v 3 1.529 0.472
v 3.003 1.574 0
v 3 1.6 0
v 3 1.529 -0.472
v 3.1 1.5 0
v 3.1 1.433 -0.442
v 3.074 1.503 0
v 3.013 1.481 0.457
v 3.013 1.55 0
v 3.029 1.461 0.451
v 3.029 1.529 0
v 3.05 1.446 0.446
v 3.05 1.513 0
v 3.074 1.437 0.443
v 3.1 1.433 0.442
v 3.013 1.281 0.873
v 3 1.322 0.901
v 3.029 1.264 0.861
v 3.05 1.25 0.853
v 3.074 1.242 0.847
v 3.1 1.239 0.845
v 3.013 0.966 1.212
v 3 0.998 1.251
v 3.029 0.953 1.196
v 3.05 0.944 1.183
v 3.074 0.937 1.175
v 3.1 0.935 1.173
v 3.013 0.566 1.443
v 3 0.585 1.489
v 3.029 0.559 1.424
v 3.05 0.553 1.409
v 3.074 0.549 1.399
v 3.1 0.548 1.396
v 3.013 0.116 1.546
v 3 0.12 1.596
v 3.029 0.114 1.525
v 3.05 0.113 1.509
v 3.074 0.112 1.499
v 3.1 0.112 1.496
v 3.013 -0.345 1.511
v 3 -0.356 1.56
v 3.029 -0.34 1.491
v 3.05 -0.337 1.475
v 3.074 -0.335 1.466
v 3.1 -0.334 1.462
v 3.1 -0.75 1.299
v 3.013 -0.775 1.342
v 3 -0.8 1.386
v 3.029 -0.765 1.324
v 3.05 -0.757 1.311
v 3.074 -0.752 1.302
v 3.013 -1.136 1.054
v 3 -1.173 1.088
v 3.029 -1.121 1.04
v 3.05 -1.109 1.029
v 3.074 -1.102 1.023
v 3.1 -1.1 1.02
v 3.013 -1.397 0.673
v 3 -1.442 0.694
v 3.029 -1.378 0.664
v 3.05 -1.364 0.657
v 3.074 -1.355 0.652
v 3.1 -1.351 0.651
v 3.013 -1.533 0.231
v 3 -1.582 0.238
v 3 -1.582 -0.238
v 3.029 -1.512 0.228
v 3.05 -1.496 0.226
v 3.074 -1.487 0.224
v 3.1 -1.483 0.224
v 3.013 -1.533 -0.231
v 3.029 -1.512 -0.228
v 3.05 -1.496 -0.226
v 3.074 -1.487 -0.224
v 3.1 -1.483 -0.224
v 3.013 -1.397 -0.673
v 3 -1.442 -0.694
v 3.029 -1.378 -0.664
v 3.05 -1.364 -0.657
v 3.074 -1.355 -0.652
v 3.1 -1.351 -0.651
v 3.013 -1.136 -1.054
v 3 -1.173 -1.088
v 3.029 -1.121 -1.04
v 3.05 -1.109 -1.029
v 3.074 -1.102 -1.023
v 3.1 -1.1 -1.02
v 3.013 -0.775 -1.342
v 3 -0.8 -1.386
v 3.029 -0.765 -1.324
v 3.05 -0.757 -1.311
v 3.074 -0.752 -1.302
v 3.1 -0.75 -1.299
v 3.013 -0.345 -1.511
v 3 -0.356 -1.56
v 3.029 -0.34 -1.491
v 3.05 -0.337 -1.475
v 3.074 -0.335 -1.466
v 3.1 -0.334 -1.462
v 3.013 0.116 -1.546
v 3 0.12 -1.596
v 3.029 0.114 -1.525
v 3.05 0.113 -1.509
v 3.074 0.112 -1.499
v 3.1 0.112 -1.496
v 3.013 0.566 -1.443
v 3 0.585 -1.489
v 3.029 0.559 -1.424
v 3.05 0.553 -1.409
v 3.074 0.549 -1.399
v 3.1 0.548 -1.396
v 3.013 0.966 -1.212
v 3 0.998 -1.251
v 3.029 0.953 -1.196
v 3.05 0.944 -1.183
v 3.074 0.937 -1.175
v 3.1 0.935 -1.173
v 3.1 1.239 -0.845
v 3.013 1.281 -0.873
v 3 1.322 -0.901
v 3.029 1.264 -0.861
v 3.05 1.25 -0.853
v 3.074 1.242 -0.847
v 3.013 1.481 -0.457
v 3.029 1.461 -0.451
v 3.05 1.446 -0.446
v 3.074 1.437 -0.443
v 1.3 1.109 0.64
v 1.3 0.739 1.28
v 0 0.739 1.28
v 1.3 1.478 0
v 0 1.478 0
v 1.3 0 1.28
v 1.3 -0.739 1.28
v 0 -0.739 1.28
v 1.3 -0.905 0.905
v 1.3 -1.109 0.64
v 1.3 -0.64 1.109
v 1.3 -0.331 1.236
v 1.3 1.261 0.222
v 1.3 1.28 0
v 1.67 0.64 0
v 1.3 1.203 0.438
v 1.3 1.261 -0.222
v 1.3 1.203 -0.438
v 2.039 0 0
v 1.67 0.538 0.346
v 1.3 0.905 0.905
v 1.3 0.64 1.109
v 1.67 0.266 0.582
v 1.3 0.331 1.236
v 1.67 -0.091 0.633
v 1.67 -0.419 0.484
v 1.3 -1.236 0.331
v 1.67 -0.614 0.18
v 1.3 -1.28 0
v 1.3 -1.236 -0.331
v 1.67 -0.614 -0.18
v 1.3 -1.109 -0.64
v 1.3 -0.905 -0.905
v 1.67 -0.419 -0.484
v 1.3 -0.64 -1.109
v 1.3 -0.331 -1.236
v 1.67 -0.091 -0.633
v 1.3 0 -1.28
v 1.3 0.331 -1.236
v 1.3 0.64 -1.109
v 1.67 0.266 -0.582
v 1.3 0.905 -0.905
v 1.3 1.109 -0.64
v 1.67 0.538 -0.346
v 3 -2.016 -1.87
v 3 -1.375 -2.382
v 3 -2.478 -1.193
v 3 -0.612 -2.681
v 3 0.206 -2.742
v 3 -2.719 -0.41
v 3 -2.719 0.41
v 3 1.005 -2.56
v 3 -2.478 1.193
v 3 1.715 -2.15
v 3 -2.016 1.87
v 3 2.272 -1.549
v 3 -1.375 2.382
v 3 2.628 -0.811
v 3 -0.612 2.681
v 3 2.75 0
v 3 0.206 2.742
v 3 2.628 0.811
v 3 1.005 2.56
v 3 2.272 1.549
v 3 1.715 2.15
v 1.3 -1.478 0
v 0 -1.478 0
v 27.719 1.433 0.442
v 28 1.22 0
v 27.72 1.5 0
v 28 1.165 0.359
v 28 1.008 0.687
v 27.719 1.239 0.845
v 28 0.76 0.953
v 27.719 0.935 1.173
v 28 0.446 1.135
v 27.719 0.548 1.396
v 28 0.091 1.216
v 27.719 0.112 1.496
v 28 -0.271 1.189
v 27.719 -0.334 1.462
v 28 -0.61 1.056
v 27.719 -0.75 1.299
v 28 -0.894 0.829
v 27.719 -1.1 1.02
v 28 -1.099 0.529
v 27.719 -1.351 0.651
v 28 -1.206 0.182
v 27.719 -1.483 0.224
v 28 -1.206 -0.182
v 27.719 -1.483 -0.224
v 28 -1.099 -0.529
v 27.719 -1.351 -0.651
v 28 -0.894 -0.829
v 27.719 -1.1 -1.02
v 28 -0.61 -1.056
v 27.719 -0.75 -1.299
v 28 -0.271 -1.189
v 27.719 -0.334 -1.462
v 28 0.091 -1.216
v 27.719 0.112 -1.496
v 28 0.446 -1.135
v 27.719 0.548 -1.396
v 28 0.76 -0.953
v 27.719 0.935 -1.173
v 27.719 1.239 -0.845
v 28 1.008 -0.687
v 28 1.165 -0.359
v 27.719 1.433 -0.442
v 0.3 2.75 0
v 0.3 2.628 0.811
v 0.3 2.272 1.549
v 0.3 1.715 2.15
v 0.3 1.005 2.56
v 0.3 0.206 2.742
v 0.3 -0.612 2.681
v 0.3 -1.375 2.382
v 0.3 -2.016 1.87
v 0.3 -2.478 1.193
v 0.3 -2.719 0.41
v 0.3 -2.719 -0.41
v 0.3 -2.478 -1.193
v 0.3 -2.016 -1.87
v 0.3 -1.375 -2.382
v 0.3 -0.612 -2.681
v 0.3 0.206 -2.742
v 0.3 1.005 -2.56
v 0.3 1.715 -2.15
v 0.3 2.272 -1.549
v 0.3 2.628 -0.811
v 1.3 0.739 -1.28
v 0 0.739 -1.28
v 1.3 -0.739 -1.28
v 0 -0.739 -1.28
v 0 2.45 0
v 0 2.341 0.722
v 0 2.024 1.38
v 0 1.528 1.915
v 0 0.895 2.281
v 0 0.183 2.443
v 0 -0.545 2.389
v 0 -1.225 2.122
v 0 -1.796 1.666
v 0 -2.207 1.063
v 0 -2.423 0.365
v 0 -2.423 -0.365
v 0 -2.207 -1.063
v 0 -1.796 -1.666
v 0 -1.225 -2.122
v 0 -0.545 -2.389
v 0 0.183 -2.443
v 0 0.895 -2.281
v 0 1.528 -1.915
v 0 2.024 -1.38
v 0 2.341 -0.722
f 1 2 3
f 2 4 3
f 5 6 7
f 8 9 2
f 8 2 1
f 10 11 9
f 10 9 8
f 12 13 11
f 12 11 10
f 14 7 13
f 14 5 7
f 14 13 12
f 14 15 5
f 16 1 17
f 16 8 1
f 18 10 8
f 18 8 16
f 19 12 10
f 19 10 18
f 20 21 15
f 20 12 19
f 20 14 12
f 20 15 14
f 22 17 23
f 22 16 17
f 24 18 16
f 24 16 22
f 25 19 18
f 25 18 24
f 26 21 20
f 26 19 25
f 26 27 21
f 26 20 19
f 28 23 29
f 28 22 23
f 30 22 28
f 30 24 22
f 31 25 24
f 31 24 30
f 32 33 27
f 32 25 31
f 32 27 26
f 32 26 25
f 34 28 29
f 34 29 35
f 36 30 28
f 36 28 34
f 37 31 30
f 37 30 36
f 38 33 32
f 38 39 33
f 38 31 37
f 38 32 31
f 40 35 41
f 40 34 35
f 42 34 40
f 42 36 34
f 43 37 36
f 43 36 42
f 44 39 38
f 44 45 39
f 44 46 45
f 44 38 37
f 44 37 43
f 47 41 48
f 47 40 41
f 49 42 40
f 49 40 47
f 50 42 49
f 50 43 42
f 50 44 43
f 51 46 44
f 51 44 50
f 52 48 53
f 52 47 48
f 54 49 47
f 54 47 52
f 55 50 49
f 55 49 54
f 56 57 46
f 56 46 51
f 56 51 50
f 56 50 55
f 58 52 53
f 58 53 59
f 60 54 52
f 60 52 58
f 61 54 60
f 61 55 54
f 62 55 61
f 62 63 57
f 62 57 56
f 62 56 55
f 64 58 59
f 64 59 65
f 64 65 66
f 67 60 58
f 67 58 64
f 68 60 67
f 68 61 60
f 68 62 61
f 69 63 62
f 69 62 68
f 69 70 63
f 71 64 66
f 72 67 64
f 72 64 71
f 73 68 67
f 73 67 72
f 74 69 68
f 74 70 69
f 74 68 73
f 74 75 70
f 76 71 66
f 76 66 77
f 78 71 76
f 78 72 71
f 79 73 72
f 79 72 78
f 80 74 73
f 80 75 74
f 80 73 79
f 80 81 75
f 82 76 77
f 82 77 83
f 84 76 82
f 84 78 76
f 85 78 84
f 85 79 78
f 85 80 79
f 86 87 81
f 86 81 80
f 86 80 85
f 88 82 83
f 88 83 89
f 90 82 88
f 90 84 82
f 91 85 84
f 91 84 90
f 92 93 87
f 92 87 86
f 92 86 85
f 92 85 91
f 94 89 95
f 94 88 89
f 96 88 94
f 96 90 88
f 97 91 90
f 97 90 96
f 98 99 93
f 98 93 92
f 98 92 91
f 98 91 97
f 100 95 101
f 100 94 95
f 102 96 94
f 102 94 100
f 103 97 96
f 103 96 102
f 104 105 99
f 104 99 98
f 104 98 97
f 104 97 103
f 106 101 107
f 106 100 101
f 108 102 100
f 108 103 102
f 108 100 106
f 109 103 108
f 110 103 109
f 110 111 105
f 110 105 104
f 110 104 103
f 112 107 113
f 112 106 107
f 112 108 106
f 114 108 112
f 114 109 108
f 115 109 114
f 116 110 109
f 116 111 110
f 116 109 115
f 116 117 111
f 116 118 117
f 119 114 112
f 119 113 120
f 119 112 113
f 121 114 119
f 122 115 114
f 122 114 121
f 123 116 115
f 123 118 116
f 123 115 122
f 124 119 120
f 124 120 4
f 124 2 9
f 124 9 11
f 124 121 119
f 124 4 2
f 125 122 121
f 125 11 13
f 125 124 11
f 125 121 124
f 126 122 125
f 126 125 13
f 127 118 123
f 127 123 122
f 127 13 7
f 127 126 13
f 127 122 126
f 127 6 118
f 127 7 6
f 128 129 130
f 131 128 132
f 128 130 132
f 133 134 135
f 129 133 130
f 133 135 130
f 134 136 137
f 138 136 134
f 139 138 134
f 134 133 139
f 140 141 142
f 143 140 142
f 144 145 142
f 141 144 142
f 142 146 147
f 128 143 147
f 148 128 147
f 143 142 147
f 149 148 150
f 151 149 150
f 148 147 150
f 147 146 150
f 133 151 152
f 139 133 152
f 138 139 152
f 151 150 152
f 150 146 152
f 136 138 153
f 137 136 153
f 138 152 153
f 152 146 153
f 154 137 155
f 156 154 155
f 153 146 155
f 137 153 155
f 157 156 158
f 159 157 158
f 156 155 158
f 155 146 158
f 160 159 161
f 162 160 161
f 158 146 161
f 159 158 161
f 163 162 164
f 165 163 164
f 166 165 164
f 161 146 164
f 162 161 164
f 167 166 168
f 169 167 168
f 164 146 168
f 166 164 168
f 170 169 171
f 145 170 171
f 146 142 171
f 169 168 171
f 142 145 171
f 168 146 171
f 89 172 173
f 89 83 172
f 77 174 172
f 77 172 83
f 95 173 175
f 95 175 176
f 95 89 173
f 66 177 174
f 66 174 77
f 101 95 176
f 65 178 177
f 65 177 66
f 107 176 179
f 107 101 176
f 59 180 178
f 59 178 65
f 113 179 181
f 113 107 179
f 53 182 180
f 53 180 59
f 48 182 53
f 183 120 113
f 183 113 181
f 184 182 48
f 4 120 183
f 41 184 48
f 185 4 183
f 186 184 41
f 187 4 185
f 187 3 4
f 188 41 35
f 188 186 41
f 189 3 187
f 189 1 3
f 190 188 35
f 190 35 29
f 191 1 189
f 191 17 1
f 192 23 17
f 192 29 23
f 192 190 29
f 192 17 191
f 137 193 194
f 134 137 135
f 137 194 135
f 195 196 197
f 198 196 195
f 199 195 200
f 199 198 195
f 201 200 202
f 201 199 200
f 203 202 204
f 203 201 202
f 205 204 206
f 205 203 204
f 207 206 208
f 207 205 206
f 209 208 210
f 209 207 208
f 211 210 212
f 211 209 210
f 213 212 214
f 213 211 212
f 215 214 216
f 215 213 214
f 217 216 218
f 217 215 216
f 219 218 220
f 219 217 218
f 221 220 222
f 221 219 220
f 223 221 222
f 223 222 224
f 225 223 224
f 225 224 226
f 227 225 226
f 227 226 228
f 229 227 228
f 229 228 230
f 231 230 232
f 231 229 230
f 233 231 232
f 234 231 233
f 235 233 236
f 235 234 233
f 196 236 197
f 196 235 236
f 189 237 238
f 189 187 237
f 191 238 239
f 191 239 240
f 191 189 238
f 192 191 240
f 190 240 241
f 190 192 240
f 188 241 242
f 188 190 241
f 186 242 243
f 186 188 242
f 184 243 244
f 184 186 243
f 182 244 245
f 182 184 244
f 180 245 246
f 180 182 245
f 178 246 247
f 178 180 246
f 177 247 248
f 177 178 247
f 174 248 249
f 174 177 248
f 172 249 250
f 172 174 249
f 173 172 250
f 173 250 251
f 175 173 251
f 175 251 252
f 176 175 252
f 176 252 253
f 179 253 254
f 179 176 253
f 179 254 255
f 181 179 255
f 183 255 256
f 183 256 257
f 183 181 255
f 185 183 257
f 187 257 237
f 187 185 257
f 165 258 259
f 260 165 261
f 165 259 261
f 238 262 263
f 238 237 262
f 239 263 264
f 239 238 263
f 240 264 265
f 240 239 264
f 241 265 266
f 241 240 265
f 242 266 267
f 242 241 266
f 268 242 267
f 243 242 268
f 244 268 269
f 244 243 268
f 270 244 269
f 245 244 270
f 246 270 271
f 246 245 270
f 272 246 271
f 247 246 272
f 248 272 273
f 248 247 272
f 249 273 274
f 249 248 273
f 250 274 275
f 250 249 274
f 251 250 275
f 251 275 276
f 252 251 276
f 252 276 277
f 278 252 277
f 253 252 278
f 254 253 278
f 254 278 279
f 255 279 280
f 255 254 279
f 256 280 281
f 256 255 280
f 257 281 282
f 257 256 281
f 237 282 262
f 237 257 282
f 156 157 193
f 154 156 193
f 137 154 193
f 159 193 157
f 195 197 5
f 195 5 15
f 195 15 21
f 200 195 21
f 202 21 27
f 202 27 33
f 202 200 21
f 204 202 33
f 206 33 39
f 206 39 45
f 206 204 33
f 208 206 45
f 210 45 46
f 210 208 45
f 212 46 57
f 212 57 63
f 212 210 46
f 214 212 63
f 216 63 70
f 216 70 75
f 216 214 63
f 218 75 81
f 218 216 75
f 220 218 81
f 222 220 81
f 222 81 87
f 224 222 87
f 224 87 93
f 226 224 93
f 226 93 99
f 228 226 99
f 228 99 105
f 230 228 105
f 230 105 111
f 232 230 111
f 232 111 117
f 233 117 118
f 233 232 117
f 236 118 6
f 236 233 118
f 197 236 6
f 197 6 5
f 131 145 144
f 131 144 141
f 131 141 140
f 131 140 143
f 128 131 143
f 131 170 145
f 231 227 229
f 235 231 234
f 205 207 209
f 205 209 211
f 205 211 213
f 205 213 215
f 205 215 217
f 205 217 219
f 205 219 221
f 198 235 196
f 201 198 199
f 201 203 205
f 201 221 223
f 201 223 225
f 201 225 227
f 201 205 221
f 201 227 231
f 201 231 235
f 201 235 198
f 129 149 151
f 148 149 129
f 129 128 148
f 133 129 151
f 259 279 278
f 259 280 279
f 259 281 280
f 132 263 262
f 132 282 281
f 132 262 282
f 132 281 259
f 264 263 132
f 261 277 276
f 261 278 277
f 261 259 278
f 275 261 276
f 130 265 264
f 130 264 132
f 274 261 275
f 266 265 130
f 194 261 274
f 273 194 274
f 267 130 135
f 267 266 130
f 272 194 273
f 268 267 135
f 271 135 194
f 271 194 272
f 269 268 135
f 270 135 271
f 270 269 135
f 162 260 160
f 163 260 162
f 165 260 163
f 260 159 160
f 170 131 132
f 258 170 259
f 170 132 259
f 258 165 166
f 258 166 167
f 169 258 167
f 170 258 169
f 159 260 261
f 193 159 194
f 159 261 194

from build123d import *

# Parameters (mm, degrees)
FILLET1_R   = 0.1
HEX_2_DEPTH = 1.3


with BuildPart() as part:
    # BodySke → Base-Revolve (revolve)
    with BuildSketch(Plane.XY):
        Polygon((0, 0), (0, 2.45), (0.3, 2.75), (3, 2.75), (3, 1.5), (27.7195, 1.5), (28, 1.2195), (28, 0), align=None)
    revolve(axis=Axis((-31.75, 0, 0), (1, 0, 0)))

    # Fillet1
    fillet1_edges = [part.edges().sort_by_distance(p)[0] for p in [
        (3, -1.5, 0),
    ]]
    fillet(fillet1_edges, radius=FILLET1_R)

    # Sketch2 → Hex-PreBroach (revolve, cut)
    with BuildSketch(Plane.XY):
        Polygon((0, 1.28), (1.3, 1.28), (2.039008345, 0), (0, 0), align=None)
    revolve(axis=Axis((0, 0, 0), (1, 0, 0)), mode=Mode.SUBTRACT)

    # Sketch3 → Hex 2 (cut)
    with BuildSketch(Plane(origin=(0, 0, 0), x_dir=(0, 0.5, 0.866025404), z_dir=(-1, 0, 0))):
        Polygon((0.739008345, 1.28), (-0.739008345, 1.28), (-1.478016689, 0), (-0.739008345, -1.28), (0.739008345, -1.28), (1.478016689, 0), align=None)
    extrude(amount=-HEX_2_DEPTH, mode=Mode.SUBTRACT)


solid = part.part
